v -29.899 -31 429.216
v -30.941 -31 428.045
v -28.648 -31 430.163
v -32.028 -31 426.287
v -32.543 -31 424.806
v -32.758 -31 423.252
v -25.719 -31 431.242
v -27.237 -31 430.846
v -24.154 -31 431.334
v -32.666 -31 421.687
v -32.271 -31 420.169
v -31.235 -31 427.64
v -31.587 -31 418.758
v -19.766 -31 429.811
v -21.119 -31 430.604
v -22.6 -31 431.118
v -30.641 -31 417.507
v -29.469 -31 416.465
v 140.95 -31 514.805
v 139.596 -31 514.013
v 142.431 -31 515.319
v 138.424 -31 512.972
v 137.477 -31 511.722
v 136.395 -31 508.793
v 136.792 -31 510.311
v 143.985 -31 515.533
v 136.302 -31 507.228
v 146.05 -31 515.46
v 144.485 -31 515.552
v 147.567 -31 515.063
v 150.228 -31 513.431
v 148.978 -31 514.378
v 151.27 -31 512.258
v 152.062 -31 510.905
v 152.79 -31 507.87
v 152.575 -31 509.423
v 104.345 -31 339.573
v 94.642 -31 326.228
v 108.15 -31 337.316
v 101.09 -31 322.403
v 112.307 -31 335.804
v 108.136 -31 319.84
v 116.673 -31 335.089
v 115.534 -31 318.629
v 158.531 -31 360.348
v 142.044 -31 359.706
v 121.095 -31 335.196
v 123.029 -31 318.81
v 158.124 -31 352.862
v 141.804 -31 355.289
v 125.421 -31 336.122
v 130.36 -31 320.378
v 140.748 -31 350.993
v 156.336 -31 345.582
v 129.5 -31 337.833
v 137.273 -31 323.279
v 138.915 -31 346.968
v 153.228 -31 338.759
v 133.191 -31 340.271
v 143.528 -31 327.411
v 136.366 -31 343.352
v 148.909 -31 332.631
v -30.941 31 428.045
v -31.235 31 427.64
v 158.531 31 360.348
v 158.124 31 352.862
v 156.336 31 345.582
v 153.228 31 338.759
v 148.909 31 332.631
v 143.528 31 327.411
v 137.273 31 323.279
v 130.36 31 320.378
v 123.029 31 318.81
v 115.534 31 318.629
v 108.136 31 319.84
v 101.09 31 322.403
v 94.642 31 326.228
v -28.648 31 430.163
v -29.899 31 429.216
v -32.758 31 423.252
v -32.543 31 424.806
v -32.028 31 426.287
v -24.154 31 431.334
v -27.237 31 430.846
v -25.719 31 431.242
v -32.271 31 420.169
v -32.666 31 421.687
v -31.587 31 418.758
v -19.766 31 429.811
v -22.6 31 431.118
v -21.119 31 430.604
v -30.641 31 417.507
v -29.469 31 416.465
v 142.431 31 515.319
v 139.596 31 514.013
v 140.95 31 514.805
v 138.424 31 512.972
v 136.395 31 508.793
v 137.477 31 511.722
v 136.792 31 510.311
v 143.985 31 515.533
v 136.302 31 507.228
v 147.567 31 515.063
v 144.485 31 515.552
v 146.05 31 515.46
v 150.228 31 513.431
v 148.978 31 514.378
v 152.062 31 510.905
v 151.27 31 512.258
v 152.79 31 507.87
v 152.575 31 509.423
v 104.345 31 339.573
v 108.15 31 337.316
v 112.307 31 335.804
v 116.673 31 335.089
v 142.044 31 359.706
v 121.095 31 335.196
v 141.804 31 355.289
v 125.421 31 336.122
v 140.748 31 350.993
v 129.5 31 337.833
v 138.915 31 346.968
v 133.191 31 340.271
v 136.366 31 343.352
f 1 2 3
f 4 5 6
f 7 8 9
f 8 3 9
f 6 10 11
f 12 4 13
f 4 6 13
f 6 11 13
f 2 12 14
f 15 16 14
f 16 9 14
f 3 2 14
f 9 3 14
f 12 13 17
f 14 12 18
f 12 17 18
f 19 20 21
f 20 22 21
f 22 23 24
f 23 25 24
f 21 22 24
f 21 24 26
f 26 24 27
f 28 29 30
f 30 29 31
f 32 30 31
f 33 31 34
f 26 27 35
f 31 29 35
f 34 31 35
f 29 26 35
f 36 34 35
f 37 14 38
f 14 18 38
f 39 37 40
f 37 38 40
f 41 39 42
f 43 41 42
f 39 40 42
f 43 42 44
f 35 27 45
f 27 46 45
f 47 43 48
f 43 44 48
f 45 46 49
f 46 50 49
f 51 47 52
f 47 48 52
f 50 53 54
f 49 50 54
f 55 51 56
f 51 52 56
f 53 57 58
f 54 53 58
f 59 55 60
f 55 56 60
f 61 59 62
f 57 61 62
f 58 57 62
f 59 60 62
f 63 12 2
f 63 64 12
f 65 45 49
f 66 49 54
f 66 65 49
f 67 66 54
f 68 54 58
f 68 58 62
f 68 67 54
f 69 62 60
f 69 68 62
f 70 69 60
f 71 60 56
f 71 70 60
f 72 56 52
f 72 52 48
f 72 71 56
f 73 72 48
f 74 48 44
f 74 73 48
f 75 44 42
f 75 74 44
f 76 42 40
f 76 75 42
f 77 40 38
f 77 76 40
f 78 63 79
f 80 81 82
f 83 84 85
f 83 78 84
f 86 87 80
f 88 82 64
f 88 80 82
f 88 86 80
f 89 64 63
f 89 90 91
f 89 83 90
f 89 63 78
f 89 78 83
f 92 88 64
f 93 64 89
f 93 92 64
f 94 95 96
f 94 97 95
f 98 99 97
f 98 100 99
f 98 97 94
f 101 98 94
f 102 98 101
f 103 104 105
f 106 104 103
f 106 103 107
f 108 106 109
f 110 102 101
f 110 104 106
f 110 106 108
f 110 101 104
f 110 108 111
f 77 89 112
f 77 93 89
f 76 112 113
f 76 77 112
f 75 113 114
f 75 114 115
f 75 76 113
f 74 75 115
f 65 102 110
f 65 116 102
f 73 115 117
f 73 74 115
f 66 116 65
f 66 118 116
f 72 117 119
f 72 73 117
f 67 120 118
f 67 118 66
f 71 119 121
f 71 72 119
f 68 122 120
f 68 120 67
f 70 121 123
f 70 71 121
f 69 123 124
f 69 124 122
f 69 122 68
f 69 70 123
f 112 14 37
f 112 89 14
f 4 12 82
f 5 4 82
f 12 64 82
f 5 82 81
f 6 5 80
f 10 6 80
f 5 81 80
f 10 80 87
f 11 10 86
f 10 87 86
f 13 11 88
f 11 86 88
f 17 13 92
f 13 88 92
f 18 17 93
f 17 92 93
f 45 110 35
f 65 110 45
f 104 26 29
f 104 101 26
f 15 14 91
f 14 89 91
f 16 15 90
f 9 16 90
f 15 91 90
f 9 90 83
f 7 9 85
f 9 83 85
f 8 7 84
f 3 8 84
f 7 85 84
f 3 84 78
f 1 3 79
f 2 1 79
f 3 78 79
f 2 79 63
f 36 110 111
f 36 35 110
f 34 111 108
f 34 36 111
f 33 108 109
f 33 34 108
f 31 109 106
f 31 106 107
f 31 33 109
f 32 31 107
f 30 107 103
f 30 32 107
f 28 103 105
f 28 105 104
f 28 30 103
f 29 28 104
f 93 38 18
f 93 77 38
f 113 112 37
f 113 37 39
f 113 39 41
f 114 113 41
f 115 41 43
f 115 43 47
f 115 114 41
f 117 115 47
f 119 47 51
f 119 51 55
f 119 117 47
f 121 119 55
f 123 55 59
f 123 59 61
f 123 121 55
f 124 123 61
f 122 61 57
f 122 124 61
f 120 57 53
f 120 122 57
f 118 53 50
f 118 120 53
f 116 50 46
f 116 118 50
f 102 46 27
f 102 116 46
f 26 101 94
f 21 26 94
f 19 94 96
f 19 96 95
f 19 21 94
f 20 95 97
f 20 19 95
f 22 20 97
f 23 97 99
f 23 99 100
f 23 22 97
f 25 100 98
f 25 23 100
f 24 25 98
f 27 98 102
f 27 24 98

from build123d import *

# Parameters (mm, degrees)
EXTRUDE_THIN1_DEPTH = 31
FILLET1_R           = 8


with BuildPart() as part:
    # Sketch1 → Extrude-Thin1 (new, symmetric)
    with BuildSketch(Plane(origin=(0, 0, 0), x_dir=(1, 0, 0), z_dir=(0, 1, 0))):
        with BuildLine():
            Line((152.47855459256846, -515.8635684817917), (152.7896920748552, -507.8696211797939))
            Line((152.7896920748552, -507.8696211797939), (158.5314712170514, -360.34808328894457))
            ThreePointArc((158.5314712170514, -360.3480832889447), (137.27301850763482, -323.2785971562588), (94.64239044734069, -326.2278623062159))
            Line((94.64239044734076, -326.22786230621585), (-35.939394152340476, -421.1695886755354))
            Line((-35.939394152340476, -421.1695886755354), (-26.236355613015643, -434.5150389528538))
            Line((-26.236355613015643, -434.5150389528538), (104.3454289866656, -339.57331258353423))
            ThreePointArc((104.34542898666567, -339.5733125835342), (129.50014740733602, -337.8330629608887), (142.04395490668114, -359.70636223172806))
            Line((142.04395490668114, -359.7063622317282), (136.30217576448493, -507.2279001225775))
            Line((136.30217576448493, -507.2279001225775), (135.9910382821982, -515.2218474245752))
            Line((135.9910382821982, -515.2218474245752), (152.47855459256846, -515.8635684817917))
        make_face()
    extrude(amount=EXTRUDE_THIN1_DEPTH, both=True)

    # Fillet1
    fillet1_edges = [part.edges().sort_by_distance(p)[0] for p in [
        (152.47855459256846, 0, 515.8635684817917),
        (135.9910382821982, 0, 515.2218474245752),
        (-26.236355613015643, 0, 434.5150389528538),
        (-35.939394152340476, 0, 421.1695886755354),
    ]]
    fillet(fillet1_edges, radius=FILLET1_R)


solid = part.part
